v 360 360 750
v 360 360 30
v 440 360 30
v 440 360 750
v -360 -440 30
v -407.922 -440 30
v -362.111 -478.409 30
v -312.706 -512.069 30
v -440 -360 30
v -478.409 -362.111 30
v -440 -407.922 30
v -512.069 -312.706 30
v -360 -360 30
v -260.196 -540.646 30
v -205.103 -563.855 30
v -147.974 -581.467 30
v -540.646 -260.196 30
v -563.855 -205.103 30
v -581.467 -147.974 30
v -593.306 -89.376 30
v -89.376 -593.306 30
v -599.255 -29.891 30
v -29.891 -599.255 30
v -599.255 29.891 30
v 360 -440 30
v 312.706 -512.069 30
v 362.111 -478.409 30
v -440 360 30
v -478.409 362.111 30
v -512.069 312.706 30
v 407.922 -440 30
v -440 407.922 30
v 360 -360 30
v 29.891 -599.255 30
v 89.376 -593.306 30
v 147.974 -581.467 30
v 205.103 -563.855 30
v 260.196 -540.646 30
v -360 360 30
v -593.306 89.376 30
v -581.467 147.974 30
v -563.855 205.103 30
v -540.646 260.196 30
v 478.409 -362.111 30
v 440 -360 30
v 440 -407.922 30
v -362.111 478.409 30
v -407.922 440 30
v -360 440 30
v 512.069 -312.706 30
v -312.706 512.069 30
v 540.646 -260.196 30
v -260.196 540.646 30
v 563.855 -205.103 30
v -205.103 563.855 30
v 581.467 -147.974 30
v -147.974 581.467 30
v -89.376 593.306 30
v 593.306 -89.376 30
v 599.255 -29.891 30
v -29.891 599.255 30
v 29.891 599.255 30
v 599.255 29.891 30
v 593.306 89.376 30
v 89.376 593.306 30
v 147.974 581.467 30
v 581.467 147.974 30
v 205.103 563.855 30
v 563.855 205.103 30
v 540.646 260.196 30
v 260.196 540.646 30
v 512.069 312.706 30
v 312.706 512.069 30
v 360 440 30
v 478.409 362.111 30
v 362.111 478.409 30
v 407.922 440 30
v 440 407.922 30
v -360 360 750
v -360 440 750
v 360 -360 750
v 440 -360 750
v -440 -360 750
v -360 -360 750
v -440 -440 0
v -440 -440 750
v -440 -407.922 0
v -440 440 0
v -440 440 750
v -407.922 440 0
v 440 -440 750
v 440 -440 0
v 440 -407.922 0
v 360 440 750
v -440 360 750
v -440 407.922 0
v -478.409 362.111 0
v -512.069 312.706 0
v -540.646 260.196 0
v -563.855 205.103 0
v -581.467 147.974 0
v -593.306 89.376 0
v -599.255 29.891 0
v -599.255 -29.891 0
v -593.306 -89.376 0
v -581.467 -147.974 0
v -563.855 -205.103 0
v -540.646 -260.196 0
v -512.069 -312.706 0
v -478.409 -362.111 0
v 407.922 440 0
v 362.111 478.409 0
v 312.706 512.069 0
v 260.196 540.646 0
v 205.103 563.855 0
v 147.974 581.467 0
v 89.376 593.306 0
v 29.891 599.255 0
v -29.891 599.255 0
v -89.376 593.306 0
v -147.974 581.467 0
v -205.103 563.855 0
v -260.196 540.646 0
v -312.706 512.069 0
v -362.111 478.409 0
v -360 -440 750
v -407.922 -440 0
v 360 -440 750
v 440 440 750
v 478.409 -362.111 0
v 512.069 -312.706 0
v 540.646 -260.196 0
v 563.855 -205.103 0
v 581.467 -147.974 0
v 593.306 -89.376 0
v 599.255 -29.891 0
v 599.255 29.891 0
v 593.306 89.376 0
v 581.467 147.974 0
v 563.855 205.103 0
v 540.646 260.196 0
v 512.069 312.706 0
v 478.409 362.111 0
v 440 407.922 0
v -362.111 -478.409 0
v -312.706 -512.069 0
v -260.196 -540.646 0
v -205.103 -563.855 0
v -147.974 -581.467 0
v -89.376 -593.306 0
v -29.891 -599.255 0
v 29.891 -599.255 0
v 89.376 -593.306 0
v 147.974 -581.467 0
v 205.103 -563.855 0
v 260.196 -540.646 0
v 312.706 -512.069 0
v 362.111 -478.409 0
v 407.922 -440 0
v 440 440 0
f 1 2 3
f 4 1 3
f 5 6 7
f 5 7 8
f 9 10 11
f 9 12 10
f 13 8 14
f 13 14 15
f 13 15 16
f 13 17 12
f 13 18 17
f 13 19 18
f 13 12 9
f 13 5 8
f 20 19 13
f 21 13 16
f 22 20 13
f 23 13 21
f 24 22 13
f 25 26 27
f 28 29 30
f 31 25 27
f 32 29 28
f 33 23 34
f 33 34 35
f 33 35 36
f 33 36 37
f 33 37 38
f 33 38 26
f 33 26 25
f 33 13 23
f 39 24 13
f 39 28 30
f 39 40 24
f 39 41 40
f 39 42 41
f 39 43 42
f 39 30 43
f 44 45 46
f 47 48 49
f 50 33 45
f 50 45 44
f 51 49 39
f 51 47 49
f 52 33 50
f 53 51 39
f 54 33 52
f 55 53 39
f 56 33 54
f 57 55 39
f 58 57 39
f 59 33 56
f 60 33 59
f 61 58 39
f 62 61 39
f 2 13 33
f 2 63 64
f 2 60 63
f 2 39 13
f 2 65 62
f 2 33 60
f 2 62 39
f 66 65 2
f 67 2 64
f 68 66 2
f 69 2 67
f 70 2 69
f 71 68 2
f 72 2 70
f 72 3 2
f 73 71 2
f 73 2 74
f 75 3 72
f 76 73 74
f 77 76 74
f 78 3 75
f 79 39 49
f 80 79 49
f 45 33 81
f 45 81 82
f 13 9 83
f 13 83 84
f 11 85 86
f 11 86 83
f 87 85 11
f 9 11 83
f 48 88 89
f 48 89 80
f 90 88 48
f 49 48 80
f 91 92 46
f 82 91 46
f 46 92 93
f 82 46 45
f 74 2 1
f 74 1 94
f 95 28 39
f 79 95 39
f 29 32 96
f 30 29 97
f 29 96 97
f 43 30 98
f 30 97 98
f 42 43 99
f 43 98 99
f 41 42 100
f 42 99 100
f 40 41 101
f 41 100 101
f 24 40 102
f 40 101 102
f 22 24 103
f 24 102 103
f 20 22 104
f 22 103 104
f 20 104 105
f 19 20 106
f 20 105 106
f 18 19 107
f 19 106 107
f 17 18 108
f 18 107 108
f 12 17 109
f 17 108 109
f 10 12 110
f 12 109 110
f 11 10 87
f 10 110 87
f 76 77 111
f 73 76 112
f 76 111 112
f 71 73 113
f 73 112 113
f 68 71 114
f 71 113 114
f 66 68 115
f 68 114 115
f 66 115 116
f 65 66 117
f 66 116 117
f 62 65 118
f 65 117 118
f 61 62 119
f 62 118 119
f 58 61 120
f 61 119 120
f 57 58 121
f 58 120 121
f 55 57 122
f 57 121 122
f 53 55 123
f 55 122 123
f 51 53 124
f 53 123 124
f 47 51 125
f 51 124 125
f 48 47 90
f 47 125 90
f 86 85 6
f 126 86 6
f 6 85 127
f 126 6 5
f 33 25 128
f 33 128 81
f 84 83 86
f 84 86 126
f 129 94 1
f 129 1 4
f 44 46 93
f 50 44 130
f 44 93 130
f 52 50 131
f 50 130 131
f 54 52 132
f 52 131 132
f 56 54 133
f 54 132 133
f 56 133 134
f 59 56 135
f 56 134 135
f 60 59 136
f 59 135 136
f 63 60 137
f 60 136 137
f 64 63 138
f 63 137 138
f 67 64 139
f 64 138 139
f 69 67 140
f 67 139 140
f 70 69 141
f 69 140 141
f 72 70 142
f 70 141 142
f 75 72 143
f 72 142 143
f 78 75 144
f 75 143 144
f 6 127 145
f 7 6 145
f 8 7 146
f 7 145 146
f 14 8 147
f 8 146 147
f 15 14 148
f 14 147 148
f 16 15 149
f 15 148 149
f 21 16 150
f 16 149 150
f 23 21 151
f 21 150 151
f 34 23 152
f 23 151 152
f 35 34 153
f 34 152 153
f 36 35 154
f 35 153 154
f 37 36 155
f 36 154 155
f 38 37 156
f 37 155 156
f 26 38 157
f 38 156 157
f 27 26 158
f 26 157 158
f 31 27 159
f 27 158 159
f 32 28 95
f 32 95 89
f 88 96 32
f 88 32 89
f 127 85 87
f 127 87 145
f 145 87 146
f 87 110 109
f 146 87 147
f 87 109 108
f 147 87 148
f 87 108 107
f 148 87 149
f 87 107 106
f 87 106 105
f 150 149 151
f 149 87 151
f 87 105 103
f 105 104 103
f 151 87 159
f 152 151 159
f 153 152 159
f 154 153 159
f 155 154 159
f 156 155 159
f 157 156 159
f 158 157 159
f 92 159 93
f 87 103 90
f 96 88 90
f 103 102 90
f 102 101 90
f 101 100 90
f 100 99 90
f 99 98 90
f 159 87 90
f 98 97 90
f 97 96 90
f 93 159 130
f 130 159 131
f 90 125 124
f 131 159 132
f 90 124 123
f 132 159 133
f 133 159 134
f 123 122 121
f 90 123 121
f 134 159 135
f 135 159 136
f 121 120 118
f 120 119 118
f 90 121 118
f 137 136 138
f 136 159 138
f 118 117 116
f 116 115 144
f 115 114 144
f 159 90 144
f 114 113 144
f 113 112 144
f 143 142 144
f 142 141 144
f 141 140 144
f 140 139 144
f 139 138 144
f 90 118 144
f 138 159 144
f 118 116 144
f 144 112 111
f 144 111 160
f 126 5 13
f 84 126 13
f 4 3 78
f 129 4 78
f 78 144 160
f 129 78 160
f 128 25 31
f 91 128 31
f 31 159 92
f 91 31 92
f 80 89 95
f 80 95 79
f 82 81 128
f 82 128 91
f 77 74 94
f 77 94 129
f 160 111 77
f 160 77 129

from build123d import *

# Parameters (mm, degrees)
SKETCH_1_R      = 600
EXTRUDE_1_DEPTH = 30
SKETCH_2_W      = 80
SKETCH_2_H      = 80
EXTRUDE_2_DEPTH = 750
SKETCH_3_W      = 80
SKETCH_3_H      = 80
EXTRUDE_3_DEPTH = 750
SKETCH_4_W      = 80
SKETCH_4_H      = 80
EXTRUDE_4_DEPTH = 750
SKETCH_5_W      = 80
SKETCH_5_H      = 80
EXTRUDE_5_DEPTH = 750


with BuildPart() as part:
    # 草图1 → 凸台-拉伸1 (new body)
    with BuildSketch(Plane.XY):
        Circle(SKETCH_1_R)
    extrude(amount=EXTRUDE_1_DEPTH)

    # 草图2 → 凸台-拉伸2 (add)
    with BuildSketch(Plane.XY):
        with Locations((-400, -400)):
            Rectangle(SKETCH_2_W, SKETCH_2_H)
    extrude(amount=EXTRUDE_2_DEPTH)

    # 草图3 → 凸台-拉伸3 (add)
    with BuildSketch(Plane.XY):
        with Locations((400, -400)):
            Rectangle(SKETCH_3_W, SKETCH_3_H)
    extrude(amount=EXTRUDE_3_DEPTH)

    # 草图4 → 凸台-拉伸4 (add)
    with BuildSketch(Plane.XY):
        with Locations((-400, 400)):
            Rectangle(SKETCH_4_W, SKETCH_4_H)
    extrude(amount=EXTRUDE_4_DEPTH)

    # 草图5 → 凸台-拉伸5 (add)
    with BuildSketch(Plane.XY):
        with Locations((400, 400)):
            Rectangle(SKETCH_5_W, SKETCH_5_H)
    extrude(amount=EXTRUDE_5_DEPTH)


solid = part.part
